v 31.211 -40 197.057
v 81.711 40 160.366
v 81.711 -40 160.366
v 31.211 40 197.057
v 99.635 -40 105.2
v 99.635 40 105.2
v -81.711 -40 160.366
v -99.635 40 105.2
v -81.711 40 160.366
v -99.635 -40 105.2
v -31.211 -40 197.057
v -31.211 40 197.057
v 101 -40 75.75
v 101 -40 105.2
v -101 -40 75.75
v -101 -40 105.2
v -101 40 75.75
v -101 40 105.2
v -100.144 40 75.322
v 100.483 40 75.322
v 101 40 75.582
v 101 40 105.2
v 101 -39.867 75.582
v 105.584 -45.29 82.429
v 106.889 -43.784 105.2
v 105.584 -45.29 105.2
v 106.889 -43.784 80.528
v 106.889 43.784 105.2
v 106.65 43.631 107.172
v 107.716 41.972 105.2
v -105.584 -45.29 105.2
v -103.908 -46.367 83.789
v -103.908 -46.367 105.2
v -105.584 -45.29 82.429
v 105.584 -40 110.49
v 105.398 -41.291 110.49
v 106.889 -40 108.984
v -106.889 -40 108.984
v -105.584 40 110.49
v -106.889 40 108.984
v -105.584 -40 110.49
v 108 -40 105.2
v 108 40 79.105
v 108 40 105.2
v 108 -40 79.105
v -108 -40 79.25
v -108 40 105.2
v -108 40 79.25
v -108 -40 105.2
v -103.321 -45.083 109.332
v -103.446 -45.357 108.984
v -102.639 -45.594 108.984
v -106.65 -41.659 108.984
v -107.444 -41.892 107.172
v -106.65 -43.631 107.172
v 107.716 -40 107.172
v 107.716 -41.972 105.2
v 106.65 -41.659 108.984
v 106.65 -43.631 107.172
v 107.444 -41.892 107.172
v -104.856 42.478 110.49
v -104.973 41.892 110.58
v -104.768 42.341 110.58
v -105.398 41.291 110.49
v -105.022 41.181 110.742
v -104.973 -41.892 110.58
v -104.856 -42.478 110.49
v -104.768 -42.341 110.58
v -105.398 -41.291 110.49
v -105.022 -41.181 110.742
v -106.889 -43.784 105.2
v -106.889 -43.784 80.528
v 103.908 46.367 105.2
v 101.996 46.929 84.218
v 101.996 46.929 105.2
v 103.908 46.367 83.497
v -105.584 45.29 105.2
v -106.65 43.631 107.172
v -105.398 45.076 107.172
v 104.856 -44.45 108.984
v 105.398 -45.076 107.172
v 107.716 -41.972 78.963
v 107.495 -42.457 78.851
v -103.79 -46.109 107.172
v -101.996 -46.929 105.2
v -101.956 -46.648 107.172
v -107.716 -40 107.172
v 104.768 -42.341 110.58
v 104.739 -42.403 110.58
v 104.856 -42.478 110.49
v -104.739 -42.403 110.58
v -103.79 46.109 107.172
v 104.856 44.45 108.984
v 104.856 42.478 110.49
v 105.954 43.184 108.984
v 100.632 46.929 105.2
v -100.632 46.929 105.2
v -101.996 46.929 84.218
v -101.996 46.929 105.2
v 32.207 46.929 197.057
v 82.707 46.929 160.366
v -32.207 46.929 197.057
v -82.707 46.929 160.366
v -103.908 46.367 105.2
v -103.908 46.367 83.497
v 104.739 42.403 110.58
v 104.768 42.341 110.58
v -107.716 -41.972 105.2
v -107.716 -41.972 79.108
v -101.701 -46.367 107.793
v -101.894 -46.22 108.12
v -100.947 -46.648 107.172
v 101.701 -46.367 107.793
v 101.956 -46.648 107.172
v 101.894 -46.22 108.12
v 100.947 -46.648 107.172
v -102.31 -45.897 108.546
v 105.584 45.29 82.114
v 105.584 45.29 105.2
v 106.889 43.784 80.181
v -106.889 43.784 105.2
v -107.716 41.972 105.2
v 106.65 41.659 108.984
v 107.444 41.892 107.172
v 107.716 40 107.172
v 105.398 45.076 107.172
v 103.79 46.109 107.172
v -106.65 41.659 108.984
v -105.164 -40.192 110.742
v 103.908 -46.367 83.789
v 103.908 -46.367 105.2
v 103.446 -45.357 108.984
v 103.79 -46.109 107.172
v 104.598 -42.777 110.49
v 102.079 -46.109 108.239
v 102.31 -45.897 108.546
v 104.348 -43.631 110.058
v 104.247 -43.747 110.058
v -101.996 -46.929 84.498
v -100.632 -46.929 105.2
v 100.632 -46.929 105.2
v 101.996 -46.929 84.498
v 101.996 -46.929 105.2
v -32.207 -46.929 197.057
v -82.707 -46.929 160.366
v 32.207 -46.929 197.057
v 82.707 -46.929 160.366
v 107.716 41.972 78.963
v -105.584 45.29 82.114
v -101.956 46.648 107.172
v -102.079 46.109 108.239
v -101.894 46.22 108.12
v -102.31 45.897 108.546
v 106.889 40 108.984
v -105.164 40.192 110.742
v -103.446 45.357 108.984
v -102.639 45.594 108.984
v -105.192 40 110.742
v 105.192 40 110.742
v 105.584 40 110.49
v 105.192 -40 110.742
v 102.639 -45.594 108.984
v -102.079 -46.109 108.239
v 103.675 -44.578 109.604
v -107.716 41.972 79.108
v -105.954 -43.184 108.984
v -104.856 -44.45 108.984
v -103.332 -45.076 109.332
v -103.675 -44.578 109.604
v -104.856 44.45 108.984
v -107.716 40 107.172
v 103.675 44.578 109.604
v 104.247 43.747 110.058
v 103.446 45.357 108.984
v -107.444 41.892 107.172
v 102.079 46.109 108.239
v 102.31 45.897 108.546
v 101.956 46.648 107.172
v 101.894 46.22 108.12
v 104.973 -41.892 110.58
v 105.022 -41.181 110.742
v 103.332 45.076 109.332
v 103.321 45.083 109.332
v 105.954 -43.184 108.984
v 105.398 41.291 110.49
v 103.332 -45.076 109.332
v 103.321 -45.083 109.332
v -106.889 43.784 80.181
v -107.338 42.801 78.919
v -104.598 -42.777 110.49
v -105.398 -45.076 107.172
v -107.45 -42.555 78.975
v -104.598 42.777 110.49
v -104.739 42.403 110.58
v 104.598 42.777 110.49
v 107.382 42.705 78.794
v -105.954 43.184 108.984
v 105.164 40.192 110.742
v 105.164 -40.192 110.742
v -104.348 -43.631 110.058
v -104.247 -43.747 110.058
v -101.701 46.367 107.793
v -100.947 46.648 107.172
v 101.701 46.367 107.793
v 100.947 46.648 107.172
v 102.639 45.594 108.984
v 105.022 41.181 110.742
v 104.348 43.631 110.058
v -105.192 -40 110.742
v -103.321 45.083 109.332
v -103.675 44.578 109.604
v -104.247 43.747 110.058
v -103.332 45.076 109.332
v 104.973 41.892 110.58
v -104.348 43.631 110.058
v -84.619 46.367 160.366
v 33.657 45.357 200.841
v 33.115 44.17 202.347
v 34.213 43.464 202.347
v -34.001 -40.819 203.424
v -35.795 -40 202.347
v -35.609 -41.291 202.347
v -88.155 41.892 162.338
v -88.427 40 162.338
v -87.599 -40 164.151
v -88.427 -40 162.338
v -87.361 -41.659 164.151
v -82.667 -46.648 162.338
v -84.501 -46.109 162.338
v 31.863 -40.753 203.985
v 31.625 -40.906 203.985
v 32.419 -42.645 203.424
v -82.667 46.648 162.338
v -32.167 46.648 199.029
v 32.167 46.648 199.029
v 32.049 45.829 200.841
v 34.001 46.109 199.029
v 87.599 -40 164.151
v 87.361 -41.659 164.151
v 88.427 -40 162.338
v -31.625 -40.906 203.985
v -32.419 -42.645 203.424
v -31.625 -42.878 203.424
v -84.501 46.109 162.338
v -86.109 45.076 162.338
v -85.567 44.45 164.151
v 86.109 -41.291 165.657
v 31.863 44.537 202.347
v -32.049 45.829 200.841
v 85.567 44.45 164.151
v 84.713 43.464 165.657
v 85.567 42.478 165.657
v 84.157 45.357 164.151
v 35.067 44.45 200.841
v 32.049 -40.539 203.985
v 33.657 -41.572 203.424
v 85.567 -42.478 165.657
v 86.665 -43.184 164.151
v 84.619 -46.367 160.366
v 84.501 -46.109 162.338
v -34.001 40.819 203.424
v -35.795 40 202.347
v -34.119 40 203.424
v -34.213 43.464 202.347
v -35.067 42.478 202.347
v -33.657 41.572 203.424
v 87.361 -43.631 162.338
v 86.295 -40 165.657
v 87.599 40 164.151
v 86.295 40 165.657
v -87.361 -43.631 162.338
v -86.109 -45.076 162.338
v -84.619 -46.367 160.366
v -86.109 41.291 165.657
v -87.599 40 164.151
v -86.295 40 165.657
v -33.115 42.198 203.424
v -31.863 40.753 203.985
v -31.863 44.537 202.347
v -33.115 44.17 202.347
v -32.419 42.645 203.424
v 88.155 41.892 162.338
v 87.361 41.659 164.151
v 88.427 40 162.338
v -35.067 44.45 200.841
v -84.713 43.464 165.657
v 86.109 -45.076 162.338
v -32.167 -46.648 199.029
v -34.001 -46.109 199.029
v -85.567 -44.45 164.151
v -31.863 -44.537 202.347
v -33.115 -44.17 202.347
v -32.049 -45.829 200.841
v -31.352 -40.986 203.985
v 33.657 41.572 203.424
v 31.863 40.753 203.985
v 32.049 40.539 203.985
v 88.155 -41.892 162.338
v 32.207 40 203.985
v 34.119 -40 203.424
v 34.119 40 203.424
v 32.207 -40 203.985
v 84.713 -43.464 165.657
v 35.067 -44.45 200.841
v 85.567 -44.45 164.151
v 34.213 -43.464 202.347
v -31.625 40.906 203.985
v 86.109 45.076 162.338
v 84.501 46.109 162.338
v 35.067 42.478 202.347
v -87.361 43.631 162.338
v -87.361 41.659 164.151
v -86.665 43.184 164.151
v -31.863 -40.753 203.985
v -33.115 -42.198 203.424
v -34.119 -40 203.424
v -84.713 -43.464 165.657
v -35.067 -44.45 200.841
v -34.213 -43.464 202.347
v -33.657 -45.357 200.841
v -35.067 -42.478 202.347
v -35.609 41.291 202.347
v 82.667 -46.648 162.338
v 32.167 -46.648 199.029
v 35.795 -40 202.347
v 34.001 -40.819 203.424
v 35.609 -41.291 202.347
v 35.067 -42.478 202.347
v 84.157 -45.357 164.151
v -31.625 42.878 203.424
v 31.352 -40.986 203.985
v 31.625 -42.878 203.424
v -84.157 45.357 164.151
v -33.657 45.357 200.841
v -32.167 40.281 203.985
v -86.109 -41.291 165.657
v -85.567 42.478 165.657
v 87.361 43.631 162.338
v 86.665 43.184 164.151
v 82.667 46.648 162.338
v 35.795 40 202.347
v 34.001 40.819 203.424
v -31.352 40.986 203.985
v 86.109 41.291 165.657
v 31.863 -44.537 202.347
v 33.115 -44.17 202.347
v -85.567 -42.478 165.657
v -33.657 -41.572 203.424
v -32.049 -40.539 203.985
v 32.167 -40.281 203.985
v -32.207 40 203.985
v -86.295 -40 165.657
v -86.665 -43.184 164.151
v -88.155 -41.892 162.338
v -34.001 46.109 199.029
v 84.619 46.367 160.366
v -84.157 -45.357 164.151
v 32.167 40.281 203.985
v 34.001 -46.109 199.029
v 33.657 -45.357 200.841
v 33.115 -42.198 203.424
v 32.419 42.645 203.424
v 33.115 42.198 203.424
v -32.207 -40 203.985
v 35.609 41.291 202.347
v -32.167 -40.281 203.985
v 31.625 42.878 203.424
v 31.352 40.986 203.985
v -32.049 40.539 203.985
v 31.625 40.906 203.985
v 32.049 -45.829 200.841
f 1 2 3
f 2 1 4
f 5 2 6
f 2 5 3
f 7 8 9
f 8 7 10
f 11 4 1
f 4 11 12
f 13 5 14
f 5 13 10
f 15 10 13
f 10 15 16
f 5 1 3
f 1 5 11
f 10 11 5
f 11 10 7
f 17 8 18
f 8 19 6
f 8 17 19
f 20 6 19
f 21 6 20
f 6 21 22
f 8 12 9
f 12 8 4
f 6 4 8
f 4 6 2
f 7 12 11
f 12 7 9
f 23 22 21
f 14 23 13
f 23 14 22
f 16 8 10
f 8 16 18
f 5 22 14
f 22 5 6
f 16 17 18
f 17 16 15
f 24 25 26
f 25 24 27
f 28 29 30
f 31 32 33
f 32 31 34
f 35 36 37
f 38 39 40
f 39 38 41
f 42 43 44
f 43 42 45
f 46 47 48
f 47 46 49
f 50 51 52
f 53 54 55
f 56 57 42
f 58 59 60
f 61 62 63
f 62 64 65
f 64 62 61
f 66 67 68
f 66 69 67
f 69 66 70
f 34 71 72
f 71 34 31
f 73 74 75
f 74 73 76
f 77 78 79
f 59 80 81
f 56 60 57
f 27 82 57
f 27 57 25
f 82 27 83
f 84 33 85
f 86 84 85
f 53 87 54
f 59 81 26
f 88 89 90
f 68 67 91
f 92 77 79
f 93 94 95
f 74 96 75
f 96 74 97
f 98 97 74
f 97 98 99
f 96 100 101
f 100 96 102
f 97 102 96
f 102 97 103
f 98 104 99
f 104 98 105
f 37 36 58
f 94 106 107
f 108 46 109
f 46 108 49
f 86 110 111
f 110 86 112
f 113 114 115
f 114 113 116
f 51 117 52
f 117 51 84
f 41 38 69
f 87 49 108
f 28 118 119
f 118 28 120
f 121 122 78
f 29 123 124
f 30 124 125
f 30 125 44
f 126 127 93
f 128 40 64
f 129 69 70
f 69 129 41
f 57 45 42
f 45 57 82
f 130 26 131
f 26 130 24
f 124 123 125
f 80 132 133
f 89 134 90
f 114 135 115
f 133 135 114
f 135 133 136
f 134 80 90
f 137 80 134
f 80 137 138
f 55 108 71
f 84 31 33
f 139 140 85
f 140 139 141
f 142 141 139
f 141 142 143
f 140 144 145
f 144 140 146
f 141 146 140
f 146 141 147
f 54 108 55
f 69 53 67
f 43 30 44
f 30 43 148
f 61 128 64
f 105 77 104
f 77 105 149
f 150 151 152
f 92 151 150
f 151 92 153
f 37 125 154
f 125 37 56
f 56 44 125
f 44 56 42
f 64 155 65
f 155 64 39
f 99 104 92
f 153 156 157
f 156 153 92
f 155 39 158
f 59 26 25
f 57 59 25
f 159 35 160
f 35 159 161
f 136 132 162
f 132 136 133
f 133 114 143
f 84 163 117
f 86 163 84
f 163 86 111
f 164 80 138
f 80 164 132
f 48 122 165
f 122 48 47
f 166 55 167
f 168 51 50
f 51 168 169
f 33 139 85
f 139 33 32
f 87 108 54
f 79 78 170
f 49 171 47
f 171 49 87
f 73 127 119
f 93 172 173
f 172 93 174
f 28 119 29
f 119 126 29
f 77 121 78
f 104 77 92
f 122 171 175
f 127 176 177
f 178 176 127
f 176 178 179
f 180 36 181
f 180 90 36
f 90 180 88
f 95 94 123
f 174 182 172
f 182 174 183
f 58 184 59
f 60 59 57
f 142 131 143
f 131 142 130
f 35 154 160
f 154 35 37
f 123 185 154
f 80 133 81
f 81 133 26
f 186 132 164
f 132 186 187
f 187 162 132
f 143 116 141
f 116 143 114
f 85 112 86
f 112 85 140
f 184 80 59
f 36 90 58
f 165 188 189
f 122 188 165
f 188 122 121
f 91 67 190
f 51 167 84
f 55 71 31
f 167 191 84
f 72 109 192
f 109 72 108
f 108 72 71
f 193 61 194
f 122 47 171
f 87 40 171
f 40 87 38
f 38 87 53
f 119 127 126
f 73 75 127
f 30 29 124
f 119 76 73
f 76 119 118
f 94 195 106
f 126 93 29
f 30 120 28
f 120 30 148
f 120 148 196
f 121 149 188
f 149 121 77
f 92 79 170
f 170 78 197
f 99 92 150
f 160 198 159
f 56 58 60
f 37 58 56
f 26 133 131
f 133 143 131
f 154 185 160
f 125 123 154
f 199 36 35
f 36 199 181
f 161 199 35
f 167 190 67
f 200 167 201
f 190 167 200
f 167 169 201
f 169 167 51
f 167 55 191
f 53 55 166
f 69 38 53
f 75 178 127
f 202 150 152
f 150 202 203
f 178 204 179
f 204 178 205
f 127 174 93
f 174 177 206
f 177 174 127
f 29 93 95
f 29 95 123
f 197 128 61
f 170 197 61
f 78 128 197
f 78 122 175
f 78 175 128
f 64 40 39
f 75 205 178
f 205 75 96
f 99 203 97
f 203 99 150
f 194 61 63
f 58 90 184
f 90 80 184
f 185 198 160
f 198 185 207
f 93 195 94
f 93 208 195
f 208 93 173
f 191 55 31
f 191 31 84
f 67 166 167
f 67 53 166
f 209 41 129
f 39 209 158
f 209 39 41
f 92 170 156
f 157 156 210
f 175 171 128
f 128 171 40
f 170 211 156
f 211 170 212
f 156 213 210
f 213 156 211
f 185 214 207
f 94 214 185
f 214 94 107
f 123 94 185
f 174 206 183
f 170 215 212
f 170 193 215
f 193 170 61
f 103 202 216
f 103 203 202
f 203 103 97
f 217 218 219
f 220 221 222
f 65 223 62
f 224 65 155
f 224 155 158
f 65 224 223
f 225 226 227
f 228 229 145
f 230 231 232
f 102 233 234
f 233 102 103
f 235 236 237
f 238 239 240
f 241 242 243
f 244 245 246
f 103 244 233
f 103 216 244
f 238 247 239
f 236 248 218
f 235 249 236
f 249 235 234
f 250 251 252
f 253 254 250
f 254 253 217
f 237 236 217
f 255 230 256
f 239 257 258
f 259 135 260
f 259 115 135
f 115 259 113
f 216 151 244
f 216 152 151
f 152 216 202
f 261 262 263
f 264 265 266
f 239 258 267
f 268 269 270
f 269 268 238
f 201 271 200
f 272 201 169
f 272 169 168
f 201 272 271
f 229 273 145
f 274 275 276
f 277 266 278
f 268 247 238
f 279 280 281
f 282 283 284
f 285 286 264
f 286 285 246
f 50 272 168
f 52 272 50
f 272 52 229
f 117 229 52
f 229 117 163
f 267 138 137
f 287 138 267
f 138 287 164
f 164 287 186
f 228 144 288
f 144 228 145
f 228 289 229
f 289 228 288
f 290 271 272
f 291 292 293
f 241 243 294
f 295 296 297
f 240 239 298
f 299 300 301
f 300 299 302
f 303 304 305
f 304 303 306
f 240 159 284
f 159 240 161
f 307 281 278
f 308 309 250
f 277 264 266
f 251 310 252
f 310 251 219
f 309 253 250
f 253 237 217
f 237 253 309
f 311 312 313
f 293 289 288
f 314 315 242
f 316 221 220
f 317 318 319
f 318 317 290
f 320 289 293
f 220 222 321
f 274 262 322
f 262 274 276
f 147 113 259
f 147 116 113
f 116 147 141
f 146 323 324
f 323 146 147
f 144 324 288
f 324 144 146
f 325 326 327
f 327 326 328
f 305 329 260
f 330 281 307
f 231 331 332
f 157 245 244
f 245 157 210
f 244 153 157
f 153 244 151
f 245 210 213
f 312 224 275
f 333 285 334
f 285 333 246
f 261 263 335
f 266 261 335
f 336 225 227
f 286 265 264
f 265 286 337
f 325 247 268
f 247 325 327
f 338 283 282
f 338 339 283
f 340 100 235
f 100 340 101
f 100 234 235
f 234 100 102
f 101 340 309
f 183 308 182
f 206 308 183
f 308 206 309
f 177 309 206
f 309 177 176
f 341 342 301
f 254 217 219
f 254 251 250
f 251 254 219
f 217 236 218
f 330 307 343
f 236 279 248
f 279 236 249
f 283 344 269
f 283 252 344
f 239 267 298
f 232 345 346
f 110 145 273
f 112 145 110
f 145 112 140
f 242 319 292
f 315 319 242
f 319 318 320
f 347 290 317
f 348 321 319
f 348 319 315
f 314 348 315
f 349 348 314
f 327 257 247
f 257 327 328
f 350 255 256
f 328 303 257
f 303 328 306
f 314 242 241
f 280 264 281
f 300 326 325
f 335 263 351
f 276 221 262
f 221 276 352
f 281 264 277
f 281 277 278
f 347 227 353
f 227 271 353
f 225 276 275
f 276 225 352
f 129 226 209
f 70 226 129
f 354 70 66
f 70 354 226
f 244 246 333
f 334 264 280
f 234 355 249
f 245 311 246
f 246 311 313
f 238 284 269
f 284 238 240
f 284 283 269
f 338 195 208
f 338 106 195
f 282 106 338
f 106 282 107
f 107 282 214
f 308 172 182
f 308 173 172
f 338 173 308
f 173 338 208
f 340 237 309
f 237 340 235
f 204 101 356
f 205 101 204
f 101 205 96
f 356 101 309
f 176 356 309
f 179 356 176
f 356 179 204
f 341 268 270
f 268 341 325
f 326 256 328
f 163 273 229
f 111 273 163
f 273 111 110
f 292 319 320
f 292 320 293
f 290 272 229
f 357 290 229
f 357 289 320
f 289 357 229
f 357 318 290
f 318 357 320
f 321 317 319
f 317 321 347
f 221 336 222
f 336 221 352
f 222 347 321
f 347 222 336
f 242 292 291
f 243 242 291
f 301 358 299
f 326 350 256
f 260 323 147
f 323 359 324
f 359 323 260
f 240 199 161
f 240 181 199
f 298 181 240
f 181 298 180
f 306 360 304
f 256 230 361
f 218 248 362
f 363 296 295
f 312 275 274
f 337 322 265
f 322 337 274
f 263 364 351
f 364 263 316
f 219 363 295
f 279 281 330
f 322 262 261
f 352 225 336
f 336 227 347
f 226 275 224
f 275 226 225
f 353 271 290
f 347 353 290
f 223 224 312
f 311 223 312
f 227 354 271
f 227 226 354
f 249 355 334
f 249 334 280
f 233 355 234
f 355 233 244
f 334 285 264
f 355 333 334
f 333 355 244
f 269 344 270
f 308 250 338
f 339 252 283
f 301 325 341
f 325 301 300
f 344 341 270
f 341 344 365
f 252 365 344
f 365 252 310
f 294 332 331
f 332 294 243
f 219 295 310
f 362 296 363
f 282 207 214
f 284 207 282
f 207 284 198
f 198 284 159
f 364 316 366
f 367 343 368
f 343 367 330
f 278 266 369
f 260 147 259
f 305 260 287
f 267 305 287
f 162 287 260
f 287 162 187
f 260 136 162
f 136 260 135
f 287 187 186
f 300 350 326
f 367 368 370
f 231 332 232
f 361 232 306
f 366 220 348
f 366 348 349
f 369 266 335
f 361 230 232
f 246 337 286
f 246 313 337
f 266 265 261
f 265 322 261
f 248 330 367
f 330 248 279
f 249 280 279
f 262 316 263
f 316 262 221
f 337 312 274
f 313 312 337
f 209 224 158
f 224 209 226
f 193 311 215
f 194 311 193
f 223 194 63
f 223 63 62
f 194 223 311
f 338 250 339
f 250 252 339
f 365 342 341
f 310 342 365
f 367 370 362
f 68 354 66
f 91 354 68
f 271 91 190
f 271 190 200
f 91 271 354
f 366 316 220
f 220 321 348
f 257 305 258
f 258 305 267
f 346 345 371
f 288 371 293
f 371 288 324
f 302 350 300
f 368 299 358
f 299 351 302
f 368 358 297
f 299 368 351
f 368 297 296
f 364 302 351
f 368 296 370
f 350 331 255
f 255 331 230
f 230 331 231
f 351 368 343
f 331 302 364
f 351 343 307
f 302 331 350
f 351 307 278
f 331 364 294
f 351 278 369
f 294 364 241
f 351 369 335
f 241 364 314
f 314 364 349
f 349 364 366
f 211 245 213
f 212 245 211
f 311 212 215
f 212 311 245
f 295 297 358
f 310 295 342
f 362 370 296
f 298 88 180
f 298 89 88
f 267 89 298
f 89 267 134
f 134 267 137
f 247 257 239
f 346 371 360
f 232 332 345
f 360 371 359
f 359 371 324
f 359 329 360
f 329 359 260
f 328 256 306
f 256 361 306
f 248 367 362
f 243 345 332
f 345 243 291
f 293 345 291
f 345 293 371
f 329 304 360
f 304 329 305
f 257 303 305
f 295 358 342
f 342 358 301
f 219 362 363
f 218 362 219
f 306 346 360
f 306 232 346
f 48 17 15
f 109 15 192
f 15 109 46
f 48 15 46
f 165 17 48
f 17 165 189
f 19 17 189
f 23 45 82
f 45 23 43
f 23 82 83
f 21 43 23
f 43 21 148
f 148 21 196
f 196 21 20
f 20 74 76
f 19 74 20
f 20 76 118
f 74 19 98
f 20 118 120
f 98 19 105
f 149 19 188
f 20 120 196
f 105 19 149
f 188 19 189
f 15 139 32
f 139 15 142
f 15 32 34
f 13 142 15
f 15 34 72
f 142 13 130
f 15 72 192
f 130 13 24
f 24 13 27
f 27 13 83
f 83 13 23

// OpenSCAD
spool_diameter = 202;
spool_height = 80;

wall_thickness = 7;
floor_thickness = 1.2;
height_margin = 0.2;


module spool(){
$fn=10;
translate([0,0,spool_diameter/2])
    rotate([90,0,0])
        cylinder(h=spool_height,d=spool_diameter,center=true);
}

module spool_inside(){  
    spool();
    translate([-spool_diameter/2,-spool_height/2,-spool_height*height_margin])
        cube([spool_diameter,spool_height,spool_diameter*(1+height_margin)/2]);
}

//spool_inside();

module spool_shell(){
    difference(){
        minkowski(){
            spool_inside();
            sphere(wall_thickness);
        }
        spool_inside();
    
    big = spool_diameter*1.5;
    translate([-big/2,-big/2,-big-spool_height*height_margin-floor_thickness])
        cube(big);
    }
}


module slice(){
    x = spool_diameter*1.5;
    y = spool_height*1.5;
    z = spool_diameter*1.5;
    hull(){
    translate([-x/2,-y/2,spool_diameter/2])
        cube([x,y,z]);
    
    translate([0,0,spool_diameter/8]){
        cube([1,1,1]);
    }
    }

}

module slice_inv(){
    x = spool_diameter*1.5*0.99;
    y = spool_height*1.5*0.99;
    z = spool_diameter*1.5*0.99;
    difference(){
        translate([-x/2,-y/2,-z/2])
            cube([x,y,z]);
        slice();
    }
}

module bottom(){
    difference(){
        spool_shell();
        slice();
    }
}

module top(){
    difference(){
        spool_shell();
        slice_inv();
    }
}


top();
//bottom();
